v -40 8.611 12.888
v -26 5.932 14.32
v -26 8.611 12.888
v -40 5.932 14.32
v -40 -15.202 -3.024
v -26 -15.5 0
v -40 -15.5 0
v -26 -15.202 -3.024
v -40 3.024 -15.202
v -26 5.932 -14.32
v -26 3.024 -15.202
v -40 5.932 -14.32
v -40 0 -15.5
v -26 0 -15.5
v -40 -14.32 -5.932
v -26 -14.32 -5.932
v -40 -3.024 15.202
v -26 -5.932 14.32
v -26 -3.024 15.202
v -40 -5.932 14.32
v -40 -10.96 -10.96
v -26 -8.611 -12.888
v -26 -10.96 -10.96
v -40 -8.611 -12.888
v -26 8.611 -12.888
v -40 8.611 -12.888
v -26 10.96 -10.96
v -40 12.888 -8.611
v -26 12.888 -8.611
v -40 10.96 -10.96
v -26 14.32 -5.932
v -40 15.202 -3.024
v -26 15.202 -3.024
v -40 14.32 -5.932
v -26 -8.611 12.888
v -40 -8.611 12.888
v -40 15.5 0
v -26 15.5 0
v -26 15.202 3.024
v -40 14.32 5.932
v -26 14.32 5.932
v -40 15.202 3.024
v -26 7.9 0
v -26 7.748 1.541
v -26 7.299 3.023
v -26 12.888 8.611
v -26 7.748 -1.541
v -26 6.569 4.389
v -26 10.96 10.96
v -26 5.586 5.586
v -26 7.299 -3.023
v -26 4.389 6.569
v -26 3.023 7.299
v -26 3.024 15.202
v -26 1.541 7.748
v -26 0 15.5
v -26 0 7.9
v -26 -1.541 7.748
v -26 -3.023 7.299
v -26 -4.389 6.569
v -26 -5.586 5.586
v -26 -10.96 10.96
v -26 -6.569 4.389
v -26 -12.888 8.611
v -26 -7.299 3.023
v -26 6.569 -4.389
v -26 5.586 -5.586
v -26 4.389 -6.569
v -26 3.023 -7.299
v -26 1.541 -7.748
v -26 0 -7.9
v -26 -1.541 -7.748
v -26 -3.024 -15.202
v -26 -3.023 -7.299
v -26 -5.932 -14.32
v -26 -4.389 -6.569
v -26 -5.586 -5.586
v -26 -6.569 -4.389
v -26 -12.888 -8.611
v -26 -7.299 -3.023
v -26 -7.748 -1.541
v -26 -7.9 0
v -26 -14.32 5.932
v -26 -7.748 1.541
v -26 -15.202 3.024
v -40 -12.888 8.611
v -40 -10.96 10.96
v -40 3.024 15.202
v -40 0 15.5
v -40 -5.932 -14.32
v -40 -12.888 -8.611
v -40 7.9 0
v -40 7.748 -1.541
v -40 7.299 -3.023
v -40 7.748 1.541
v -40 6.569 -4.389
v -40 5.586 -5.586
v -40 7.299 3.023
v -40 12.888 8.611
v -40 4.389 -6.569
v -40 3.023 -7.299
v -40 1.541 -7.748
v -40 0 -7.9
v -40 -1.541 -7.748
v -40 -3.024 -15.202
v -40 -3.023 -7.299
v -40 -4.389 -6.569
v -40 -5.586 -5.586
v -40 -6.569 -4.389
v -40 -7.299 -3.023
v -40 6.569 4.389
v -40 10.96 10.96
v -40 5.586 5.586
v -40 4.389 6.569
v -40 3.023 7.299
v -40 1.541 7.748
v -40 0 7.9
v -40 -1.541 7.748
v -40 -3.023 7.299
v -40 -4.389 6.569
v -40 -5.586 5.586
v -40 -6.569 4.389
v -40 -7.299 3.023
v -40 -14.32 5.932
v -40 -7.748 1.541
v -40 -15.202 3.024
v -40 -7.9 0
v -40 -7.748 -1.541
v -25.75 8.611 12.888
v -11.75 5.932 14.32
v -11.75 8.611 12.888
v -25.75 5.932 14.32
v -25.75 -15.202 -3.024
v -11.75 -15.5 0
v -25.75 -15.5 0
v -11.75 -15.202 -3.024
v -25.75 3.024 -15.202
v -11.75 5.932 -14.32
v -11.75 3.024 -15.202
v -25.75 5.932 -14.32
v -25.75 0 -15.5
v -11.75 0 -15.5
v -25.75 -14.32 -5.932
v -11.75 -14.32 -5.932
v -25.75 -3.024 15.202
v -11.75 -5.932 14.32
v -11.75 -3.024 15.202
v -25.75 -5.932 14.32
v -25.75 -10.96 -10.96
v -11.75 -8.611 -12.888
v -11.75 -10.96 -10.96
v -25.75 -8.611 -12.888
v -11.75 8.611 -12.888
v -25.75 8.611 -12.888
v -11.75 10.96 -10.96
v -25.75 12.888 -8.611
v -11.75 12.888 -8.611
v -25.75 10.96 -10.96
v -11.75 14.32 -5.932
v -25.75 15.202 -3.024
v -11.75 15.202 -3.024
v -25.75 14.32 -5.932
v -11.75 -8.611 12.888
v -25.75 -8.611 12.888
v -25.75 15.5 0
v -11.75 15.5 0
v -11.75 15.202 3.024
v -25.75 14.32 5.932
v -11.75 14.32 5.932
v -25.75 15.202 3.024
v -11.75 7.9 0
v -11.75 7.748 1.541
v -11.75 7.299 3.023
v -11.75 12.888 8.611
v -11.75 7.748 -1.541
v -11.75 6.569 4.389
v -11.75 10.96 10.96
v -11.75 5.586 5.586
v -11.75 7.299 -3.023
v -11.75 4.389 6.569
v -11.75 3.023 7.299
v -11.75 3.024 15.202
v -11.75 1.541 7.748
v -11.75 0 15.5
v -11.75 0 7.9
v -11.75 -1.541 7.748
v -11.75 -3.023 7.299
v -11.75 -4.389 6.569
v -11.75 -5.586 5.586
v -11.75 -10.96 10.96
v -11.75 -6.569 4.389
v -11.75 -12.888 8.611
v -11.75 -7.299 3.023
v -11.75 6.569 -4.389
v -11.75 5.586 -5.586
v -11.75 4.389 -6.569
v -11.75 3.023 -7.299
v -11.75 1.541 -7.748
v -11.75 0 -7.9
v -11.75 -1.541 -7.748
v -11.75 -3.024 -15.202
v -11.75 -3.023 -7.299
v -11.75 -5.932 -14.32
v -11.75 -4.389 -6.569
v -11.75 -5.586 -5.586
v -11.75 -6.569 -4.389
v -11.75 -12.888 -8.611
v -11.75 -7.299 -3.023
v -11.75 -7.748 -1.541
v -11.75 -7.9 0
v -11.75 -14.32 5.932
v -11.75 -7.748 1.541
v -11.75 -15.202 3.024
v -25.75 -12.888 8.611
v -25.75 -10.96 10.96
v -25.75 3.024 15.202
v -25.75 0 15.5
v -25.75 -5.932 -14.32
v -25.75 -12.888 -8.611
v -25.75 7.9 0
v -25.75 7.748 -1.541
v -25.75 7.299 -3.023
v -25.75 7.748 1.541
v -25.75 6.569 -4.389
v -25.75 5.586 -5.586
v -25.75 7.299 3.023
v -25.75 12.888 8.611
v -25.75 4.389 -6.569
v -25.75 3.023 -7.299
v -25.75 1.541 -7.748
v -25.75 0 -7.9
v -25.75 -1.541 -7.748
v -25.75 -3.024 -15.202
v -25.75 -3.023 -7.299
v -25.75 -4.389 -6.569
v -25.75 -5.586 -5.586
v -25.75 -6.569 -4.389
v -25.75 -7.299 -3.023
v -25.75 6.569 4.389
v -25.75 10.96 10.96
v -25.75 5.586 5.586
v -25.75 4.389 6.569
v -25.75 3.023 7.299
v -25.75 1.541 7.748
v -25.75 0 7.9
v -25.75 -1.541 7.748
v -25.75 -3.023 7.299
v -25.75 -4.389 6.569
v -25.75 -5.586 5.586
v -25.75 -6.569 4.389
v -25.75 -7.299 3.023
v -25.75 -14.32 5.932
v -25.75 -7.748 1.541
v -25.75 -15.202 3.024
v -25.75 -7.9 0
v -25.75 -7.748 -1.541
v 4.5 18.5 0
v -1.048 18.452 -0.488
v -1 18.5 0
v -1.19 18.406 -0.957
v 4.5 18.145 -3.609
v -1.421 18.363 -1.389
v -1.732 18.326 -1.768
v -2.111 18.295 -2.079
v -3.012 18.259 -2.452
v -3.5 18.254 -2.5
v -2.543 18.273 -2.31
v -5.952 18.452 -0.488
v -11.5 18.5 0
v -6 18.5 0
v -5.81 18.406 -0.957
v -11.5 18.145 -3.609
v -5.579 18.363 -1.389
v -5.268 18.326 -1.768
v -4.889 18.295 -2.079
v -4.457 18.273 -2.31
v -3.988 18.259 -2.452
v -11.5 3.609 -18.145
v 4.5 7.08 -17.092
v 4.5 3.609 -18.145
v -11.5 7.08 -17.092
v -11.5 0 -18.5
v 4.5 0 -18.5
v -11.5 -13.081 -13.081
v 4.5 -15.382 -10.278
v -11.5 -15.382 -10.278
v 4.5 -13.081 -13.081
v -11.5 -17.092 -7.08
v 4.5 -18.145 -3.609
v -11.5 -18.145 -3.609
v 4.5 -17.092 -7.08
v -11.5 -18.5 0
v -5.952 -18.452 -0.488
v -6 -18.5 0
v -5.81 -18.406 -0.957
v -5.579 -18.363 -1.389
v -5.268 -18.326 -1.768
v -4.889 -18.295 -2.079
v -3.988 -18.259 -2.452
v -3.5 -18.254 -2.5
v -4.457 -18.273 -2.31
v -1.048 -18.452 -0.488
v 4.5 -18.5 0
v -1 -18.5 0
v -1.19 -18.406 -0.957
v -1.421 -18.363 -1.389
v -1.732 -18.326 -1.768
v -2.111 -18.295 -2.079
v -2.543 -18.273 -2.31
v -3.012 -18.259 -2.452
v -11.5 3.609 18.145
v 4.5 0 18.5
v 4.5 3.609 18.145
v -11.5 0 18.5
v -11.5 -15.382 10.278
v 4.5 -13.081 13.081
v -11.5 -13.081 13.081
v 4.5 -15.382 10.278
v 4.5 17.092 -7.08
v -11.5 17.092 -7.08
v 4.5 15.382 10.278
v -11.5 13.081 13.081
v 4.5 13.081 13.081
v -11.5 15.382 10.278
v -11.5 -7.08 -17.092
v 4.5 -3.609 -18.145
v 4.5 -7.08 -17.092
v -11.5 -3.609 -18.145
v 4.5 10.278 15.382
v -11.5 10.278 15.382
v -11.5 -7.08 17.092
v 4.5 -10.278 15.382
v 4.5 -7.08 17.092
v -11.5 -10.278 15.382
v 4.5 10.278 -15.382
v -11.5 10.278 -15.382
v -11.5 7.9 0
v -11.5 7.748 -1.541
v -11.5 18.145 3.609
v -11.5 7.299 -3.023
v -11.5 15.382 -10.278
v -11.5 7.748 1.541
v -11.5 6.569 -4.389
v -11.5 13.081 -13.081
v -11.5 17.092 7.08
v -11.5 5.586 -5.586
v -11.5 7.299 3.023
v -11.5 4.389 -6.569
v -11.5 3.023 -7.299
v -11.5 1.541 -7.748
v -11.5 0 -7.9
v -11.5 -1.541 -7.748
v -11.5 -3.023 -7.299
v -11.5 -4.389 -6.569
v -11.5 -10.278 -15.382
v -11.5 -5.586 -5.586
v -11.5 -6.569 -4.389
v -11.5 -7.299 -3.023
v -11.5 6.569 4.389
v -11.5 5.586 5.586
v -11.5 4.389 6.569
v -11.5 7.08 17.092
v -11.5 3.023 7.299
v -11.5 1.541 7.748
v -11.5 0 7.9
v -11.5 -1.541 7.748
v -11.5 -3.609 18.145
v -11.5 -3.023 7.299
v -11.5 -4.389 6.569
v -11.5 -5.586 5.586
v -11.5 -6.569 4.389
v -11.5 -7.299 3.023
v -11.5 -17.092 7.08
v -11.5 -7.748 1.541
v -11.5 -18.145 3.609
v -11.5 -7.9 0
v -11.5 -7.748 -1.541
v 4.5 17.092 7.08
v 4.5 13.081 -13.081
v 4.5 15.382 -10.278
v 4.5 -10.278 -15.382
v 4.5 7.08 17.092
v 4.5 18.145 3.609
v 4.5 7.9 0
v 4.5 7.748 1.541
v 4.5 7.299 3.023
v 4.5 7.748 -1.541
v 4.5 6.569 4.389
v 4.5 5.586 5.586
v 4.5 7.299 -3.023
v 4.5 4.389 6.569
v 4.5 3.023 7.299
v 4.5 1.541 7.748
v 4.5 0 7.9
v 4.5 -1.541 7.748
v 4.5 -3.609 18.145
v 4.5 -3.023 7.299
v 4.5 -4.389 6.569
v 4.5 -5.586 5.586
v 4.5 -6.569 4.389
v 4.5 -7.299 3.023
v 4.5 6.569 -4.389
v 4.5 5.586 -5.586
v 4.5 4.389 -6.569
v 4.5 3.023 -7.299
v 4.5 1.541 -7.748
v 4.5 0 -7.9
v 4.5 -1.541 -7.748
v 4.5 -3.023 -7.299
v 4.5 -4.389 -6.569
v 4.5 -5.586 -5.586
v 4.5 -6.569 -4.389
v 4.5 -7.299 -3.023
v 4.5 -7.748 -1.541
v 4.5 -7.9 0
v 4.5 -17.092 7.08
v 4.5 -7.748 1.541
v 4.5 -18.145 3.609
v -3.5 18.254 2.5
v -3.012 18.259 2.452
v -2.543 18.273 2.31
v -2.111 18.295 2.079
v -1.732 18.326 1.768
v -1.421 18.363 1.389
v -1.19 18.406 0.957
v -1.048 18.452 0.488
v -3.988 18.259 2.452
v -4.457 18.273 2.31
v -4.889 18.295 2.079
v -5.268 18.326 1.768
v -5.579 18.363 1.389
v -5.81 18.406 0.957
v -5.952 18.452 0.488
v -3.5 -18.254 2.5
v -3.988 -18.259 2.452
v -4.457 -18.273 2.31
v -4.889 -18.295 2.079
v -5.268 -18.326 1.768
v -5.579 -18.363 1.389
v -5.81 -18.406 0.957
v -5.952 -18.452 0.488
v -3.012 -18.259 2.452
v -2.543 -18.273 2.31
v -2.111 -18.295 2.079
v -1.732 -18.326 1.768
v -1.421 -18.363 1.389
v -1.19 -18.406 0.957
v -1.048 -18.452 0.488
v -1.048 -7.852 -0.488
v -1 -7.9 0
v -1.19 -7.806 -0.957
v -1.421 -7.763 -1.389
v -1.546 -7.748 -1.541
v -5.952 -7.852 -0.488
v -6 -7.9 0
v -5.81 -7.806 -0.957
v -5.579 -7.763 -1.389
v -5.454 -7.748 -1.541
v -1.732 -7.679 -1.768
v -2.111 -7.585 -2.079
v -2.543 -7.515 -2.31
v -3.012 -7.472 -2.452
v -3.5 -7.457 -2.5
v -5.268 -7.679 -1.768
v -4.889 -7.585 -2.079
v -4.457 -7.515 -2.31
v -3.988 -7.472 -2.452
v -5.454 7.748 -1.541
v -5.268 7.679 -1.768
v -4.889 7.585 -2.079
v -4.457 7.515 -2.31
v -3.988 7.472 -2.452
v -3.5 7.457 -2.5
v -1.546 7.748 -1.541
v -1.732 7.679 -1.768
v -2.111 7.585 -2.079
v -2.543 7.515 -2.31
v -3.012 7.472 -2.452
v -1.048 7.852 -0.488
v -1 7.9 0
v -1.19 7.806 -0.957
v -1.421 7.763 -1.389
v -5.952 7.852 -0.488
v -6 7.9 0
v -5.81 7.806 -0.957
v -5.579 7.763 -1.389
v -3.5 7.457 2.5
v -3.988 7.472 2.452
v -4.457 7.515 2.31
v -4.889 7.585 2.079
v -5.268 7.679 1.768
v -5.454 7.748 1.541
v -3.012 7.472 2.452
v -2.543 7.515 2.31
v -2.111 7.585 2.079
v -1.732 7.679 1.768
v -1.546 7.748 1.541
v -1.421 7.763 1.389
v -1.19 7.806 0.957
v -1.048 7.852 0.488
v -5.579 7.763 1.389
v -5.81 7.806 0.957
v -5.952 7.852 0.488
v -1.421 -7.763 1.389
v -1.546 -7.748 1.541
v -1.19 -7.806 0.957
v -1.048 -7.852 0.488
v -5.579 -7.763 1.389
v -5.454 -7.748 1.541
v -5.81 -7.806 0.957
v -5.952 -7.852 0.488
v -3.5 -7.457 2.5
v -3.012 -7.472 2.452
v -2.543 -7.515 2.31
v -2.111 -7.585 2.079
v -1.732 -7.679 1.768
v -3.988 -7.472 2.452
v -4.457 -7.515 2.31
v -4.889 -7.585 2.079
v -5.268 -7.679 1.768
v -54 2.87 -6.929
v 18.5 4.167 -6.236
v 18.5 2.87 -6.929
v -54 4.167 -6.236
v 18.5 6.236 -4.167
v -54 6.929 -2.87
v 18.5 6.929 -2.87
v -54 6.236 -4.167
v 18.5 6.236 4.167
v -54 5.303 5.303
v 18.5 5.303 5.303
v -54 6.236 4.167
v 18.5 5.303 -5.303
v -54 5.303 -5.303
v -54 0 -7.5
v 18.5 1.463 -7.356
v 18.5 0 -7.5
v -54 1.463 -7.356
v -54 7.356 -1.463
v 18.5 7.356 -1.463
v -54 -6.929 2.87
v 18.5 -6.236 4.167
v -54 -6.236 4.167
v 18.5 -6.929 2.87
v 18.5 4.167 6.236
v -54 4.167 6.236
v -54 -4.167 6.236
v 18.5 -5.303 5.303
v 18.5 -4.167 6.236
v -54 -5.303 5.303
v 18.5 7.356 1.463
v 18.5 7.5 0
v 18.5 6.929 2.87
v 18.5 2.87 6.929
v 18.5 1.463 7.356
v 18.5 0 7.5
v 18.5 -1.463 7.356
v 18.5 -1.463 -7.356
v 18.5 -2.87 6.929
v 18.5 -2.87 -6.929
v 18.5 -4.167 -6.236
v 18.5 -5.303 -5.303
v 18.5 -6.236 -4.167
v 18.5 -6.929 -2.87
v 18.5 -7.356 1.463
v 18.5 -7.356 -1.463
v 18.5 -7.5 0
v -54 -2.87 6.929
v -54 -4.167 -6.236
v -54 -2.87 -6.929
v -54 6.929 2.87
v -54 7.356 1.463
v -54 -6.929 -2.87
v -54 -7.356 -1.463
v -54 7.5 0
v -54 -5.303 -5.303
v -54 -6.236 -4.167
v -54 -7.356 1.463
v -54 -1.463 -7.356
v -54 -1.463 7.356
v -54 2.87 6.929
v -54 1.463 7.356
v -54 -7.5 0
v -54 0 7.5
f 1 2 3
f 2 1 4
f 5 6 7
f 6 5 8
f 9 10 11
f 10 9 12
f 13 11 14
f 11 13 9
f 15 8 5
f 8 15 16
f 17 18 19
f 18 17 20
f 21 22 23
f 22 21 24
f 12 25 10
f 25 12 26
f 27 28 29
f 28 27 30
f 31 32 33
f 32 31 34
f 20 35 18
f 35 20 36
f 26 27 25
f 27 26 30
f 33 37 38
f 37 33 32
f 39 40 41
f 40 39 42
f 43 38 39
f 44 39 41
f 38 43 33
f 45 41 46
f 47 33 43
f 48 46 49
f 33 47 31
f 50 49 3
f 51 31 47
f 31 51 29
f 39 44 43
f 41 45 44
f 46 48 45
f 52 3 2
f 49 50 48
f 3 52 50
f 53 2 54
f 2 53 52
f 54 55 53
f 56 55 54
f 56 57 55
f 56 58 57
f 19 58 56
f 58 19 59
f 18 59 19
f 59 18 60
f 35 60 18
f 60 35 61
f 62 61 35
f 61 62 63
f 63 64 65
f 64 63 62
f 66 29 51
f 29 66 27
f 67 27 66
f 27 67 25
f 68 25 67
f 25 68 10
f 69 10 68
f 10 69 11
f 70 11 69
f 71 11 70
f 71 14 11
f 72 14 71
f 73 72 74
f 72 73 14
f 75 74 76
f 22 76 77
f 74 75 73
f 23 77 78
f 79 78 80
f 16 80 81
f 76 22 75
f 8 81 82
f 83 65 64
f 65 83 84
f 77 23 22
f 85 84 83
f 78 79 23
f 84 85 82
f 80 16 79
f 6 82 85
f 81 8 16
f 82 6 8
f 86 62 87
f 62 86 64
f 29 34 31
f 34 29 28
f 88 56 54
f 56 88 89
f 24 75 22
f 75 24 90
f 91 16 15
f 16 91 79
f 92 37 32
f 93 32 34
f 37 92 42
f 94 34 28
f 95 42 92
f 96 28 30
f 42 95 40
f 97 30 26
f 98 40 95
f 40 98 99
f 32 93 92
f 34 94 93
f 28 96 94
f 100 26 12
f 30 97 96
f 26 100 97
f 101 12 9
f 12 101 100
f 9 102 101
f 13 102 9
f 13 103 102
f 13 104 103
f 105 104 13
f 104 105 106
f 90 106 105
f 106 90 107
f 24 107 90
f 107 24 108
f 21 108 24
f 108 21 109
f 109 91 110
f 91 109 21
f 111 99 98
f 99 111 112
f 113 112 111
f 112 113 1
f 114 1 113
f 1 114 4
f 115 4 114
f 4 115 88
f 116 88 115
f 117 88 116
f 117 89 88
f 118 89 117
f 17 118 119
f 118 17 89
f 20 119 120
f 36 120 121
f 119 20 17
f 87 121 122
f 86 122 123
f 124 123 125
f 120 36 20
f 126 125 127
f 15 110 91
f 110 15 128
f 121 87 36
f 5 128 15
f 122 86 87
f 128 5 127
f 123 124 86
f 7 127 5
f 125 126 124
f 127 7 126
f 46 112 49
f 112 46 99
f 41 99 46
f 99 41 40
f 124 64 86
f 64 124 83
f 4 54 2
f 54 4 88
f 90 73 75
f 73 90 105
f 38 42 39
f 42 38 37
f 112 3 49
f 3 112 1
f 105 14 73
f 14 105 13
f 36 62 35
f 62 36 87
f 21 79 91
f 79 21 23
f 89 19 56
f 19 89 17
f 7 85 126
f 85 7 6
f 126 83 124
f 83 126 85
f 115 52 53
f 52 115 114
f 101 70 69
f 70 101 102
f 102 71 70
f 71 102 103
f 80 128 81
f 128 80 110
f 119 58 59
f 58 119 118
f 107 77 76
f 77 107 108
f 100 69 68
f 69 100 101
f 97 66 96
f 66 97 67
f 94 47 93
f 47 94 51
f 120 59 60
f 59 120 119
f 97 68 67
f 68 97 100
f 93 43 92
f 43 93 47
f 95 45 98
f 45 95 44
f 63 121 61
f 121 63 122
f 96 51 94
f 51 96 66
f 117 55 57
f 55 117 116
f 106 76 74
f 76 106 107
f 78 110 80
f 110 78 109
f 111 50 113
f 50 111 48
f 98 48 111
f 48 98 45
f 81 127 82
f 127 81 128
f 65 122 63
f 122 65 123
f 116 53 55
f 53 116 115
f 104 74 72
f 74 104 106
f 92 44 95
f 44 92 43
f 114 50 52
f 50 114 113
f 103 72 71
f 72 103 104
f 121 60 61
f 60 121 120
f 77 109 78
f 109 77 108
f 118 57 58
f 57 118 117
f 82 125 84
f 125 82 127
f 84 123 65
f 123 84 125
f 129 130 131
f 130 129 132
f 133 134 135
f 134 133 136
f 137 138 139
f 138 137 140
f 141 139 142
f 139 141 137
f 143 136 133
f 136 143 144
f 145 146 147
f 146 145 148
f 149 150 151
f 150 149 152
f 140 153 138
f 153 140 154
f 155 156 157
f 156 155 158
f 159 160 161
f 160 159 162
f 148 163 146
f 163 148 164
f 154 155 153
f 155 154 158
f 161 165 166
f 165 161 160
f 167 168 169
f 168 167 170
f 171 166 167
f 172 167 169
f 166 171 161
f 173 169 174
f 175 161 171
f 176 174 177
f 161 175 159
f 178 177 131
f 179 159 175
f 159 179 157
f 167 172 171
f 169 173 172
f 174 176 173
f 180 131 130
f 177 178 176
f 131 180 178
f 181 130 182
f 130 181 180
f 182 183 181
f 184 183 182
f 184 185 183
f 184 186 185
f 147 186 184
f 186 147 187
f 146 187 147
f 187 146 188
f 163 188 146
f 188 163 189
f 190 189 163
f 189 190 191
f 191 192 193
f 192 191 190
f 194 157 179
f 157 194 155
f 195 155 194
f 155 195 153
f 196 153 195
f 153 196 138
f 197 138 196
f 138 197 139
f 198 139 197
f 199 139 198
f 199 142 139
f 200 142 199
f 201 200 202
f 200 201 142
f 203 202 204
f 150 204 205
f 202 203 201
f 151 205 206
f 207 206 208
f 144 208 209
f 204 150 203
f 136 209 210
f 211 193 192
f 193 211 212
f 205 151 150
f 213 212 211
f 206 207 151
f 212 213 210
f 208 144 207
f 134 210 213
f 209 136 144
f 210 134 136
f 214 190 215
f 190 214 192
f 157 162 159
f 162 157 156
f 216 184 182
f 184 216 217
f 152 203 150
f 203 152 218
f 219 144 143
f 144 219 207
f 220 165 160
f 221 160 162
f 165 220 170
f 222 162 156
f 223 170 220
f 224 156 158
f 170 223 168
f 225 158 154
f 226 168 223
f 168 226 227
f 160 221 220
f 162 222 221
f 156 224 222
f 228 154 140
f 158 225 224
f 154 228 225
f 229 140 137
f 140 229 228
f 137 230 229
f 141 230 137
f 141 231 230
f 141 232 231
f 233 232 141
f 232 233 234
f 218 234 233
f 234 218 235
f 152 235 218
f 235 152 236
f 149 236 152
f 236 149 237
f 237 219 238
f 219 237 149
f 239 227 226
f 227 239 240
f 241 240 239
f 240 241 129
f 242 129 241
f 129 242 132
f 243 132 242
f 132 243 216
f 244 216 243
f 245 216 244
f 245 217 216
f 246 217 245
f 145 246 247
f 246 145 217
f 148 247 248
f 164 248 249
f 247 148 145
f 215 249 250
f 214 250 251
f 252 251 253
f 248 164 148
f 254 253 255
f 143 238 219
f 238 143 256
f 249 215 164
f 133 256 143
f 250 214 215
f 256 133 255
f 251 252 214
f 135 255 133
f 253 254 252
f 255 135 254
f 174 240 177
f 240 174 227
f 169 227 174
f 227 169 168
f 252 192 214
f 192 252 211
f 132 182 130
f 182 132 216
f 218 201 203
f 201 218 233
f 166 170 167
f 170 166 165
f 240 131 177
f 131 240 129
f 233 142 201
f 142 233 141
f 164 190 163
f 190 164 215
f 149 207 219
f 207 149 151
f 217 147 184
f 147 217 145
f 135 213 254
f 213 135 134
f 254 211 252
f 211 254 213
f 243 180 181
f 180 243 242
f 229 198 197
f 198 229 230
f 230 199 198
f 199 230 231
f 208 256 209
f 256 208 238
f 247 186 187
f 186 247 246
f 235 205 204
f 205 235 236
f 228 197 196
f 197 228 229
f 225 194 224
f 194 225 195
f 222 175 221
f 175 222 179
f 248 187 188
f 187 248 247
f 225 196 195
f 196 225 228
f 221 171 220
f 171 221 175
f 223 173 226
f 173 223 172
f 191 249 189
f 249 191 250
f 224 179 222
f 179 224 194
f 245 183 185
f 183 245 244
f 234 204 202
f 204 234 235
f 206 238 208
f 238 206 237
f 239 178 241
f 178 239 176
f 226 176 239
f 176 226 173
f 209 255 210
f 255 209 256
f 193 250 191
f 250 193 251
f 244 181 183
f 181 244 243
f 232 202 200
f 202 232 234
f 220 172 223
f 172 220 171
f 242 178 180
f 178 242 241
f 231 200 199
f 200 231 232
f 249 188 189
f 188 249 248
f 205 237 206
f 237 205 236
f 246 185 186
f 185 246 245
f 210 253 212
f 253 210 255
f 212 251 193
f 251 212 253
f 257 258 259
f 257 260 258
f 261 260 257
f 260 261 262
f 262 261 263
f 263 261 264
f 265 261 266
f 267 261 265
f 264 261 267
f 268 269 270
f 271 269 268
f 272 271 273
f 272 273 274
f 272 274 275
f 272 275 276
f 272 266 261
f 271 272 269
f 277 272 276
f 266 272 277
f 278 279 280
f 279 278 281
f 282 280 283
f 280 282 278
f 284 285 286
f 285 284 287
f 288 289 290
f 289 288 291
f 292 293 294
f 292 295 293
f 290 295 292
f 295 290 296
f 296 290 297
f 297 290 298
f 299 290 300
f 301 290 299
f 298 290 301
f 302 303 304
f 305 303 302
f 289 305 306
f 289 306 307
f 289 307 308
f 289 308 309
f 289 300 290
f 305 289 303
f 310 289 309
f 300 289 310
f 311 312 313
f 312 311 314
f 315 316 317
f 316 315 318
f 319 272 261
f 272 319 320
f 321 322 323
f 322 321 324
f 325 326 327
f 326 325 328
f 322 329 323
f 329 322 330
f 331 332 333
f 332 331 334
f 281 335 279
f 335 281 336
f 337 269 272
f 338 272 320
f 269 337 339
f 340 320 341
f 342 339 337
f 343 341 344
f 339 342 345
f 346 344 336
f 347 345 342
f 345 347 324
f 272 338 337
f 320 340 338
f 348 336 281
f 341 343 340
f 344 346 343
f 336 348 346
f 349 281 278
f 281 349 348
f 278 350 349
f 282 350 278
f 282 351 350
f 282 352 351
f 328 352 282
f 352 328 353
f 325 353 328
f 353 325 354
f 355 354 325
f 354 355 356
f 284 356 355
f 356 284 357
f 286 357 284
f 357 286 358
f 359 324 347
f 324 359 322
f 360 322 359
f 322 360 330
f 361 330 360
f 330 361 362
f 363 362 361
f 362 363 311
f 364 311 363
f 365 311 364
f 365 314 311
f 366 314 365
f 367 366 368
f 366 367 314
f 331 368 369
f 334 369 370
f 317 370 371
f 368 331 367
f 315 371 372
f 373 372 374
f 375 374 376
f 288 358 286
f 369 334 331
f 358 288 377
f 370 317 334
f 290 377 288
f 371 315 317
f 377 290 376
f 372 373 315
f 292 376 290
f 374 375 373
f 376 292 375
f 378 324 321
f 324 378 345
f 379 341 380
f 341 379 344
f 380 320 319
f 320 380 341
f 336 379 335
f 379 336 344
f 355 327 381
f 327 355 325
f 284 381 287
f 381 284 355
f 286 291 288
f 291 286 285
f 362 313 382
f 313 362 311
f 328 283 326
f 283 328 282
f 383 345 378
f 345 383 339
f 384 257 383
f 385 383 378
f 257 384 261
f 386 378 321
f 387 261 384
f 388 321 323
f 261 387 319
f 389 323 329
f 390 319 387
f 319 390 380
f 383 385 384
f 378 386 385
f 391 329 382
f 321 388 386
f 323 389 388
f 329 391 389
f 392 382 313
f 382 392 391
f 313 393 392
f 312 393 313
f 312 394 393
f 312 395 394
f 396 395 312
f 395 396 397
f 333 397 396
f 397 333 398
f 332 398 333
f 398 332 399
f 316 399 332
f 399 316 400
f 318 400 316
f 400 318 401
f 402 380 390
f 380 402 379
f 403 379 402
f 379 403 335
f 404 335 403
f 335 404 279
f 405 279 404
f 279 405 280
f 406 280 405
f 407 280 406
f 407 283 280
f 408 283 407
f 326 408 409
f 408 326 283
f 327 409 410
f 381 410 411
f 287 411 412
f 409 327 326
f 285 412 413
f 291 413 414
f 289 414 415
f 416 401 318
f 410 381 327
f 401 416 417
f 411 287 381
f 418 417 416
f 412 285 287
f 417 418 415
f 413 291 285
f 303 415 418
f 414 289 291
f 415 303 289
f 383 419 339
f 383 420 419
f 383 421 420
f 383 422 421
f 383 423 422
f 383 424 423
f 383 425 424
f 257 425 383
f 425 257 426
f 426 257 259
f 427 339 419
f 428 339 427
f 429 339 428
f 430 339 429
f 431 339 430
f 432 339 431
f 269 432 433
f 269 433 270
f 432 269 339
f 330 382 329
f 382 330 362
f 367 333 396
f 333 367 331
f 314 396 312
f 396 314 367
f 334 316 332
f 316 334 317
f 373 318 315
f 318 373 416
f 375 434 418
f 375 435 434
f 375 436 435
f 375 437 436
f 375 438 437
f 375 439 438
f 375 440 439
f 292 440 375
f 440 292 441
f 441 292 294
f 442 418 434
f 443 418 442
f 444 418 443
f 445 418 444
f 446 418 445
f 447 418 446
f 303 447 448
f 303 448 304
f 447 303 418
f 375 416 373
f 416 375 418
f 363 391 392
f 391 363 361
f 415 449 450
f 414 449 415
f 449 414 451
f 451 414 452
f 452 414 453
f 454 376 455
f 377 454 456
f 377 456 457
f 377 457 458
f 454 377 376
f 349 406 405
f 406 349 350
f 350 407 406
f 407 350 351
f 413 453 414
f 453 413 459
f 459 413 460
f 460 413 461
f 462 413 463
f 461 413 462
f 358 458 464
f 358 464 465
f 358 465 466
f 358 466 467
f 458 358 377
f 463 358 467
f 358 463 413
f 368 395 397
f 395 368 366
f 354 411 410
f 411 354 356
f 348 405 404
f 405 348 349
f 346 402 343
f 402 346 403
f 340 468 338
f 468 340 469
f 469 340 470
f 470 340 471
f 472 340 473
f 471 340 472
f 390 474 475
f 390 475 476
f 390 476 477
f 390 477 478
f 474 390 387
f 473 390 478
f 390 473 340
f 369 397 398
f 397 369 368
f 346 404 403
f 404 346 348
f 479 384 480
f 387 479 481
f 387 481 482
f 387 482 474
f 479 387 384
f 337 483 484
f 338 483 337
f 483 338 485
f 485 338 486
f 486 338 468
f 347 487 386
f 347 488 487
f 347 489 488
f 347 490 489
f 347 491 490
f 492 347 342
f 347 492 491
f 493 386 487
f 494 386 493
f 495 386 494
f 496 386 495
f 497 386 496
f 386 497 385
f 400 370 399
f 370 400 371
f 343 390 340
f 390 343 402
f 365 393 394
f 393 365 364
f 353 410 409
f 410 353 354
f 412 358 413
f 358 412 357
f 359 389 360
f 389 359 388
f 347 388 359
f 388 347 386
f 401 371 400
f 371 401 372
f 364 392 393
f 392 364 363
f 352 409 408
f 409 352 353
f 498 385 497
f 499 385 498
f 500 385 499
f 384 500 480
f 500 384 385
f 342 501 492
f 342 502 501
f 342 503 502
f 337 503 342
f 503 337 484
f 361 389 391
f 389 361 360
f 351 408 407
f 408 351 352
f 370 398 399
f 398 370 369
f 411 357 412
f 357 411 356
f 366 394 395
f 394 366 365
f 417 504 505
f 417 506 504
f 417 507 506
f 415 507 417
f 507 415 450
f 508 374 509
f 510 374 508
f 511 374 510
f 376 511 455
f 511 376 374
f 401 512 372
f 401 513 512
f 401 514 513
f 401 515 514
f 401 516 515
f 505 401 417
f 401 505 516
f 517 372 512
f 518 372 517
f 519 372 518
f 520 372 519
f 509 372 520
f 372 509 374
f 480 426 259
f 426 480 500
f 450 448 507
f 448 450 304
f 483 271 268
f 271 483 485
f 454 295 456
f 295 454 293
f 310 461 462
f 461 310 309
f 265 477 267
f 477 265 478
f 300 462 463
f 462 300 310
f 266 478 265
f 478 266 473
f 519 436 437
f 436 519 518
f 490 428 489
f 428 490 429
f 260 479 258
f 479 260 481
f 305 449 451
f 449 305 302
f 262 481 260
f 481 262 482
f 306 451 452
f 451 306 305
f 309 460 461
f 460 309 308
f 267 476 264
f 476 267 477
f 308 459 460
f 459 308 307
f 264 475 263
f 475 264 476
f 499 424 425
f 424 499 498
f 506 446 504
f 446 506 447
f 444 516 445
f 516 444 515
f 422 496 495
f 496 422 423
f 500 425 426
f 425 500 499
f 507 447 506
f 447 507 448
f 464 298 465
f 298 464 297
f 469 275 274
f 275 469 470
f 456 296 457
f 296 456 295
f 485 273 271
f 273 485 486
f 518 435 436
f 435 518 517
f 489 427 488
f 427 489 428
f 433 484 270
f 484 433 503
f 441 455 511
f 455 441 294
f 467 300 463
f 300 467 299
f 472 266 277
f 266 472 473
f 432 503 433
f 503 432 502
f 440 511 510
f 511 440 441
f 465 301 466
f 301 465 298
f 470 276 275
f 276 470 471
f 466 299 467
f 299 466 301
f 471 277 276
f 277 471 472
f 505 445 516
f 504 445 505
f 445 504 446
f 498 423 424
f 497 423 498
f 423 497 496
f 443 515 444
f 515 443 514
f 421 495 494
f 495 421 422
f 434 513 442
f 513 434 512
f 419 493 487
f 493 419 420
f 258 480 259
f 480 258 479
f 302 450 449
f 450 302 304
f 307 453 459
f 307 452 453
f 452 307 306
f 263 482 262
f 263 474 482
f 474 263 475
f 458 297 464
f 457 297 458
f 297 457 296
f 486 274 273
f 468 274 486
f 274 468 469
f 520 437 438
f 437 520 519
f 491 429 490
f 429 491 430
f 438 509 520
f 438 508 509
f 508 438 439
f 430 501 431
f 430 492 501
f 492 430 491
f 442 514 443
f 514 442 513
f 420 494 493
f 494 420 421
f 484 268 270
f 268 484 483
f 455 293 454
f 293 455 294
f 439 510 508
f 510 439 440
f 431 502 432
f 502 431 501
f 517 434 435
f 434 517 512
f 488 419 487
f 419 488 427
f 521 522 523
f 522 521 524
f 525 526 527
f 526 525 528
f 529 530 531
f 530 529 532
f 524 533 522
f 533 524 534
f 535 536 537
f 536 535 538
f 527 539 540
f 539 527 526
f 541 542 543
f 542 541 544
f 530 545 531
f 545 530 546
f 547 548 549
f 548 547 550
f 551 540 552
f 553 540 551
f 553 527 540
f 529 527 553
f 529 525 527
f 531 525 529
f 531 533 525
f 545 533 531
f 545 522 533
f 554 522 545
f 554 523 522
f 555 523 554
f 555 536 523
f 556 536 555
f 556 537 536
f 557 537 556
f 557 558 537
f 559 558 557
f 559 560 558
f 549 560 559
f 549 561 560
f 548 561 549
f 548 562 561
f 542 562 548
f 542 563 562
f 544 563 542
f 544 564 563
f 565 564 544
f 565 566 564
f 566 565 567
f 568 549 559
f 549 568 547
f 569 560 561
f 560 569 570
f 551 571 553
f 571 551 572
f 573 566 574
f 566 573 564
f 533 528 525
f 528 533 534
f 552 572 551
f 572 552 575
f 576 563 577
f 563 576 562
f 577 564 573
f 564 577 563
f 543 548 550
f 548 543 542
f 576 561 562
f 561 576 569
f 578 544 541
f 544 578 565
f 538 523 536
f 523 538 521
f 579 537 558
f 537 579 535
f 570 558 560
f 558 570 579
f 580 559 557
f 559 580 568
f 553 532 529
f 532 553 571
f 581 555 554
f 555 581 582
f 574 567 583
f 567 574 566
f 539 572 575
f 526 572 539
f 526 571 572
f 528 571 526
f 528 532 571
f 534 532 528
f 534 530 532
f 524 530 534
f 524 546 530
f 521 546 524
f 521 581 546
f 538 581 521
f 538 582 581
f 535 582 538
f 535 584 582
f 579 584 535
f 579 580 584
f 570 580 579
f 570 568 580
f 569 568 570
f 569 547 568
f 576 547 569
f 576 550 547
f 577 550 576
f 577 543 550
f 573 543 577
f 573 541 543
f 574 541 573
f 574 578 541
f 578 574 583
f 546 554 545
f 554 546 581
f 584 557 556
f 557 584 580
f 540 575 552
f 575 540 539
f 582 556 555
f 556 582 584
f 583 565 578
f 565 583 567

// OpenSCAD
$fn = 32;

// ------------------------------------------------------------------------
// Shaft with rings and collars: d15 shaft, 3 rings
// Every part is its own module, assembly() places them once.
// ------------------------------------------------------------------------

// --- part 1 ---
module shaft() {
  translate([0, 0, -36.25]) cylinder(h = 72.5, d = 15);
}

// --- part 2 ---
module spacer_a() {
  difference() {
      translate([0, 0, 0]) cylinder(h = 14, d = 31);
      translate([0, 0, -1]) cylinder(h = 16, d = 15.8);
    }
}

// --- part 3 ---
module spacer_b() {
  difference() {
      translate([0, 0, 0]) cylinder(h = 14, d = 31);
      translate([0, 0, -1]) cylinder(h = 16, d = 15.8);
    }
}

// --- part 4 ---
module collar_a() {
  difference() {
    cylinder(h = 16, d = 37);
    translate([0, 0, -1]) cylinder(h = 18, d = 15.8);
    translate([0, 0, 8]) rotate([90, 0, 0]) cylinder(h = 39, d = 5, center = true);
  }
}

// --- assembly ---
module assembly() {
  translate([-17.75, 0, 0]) rotate([0, 90, 0]) shaft();
  translate([-40, 0, 0]) rotate([0, 90, 0]) spacer_a();
  translate([-25.75, 0, 0]) rotate([0, 90, 0]) spacer_b();
  translate([-11.5, 0, 0]) rotate([0, 90, 0]) collar_a();
}

assembly();
